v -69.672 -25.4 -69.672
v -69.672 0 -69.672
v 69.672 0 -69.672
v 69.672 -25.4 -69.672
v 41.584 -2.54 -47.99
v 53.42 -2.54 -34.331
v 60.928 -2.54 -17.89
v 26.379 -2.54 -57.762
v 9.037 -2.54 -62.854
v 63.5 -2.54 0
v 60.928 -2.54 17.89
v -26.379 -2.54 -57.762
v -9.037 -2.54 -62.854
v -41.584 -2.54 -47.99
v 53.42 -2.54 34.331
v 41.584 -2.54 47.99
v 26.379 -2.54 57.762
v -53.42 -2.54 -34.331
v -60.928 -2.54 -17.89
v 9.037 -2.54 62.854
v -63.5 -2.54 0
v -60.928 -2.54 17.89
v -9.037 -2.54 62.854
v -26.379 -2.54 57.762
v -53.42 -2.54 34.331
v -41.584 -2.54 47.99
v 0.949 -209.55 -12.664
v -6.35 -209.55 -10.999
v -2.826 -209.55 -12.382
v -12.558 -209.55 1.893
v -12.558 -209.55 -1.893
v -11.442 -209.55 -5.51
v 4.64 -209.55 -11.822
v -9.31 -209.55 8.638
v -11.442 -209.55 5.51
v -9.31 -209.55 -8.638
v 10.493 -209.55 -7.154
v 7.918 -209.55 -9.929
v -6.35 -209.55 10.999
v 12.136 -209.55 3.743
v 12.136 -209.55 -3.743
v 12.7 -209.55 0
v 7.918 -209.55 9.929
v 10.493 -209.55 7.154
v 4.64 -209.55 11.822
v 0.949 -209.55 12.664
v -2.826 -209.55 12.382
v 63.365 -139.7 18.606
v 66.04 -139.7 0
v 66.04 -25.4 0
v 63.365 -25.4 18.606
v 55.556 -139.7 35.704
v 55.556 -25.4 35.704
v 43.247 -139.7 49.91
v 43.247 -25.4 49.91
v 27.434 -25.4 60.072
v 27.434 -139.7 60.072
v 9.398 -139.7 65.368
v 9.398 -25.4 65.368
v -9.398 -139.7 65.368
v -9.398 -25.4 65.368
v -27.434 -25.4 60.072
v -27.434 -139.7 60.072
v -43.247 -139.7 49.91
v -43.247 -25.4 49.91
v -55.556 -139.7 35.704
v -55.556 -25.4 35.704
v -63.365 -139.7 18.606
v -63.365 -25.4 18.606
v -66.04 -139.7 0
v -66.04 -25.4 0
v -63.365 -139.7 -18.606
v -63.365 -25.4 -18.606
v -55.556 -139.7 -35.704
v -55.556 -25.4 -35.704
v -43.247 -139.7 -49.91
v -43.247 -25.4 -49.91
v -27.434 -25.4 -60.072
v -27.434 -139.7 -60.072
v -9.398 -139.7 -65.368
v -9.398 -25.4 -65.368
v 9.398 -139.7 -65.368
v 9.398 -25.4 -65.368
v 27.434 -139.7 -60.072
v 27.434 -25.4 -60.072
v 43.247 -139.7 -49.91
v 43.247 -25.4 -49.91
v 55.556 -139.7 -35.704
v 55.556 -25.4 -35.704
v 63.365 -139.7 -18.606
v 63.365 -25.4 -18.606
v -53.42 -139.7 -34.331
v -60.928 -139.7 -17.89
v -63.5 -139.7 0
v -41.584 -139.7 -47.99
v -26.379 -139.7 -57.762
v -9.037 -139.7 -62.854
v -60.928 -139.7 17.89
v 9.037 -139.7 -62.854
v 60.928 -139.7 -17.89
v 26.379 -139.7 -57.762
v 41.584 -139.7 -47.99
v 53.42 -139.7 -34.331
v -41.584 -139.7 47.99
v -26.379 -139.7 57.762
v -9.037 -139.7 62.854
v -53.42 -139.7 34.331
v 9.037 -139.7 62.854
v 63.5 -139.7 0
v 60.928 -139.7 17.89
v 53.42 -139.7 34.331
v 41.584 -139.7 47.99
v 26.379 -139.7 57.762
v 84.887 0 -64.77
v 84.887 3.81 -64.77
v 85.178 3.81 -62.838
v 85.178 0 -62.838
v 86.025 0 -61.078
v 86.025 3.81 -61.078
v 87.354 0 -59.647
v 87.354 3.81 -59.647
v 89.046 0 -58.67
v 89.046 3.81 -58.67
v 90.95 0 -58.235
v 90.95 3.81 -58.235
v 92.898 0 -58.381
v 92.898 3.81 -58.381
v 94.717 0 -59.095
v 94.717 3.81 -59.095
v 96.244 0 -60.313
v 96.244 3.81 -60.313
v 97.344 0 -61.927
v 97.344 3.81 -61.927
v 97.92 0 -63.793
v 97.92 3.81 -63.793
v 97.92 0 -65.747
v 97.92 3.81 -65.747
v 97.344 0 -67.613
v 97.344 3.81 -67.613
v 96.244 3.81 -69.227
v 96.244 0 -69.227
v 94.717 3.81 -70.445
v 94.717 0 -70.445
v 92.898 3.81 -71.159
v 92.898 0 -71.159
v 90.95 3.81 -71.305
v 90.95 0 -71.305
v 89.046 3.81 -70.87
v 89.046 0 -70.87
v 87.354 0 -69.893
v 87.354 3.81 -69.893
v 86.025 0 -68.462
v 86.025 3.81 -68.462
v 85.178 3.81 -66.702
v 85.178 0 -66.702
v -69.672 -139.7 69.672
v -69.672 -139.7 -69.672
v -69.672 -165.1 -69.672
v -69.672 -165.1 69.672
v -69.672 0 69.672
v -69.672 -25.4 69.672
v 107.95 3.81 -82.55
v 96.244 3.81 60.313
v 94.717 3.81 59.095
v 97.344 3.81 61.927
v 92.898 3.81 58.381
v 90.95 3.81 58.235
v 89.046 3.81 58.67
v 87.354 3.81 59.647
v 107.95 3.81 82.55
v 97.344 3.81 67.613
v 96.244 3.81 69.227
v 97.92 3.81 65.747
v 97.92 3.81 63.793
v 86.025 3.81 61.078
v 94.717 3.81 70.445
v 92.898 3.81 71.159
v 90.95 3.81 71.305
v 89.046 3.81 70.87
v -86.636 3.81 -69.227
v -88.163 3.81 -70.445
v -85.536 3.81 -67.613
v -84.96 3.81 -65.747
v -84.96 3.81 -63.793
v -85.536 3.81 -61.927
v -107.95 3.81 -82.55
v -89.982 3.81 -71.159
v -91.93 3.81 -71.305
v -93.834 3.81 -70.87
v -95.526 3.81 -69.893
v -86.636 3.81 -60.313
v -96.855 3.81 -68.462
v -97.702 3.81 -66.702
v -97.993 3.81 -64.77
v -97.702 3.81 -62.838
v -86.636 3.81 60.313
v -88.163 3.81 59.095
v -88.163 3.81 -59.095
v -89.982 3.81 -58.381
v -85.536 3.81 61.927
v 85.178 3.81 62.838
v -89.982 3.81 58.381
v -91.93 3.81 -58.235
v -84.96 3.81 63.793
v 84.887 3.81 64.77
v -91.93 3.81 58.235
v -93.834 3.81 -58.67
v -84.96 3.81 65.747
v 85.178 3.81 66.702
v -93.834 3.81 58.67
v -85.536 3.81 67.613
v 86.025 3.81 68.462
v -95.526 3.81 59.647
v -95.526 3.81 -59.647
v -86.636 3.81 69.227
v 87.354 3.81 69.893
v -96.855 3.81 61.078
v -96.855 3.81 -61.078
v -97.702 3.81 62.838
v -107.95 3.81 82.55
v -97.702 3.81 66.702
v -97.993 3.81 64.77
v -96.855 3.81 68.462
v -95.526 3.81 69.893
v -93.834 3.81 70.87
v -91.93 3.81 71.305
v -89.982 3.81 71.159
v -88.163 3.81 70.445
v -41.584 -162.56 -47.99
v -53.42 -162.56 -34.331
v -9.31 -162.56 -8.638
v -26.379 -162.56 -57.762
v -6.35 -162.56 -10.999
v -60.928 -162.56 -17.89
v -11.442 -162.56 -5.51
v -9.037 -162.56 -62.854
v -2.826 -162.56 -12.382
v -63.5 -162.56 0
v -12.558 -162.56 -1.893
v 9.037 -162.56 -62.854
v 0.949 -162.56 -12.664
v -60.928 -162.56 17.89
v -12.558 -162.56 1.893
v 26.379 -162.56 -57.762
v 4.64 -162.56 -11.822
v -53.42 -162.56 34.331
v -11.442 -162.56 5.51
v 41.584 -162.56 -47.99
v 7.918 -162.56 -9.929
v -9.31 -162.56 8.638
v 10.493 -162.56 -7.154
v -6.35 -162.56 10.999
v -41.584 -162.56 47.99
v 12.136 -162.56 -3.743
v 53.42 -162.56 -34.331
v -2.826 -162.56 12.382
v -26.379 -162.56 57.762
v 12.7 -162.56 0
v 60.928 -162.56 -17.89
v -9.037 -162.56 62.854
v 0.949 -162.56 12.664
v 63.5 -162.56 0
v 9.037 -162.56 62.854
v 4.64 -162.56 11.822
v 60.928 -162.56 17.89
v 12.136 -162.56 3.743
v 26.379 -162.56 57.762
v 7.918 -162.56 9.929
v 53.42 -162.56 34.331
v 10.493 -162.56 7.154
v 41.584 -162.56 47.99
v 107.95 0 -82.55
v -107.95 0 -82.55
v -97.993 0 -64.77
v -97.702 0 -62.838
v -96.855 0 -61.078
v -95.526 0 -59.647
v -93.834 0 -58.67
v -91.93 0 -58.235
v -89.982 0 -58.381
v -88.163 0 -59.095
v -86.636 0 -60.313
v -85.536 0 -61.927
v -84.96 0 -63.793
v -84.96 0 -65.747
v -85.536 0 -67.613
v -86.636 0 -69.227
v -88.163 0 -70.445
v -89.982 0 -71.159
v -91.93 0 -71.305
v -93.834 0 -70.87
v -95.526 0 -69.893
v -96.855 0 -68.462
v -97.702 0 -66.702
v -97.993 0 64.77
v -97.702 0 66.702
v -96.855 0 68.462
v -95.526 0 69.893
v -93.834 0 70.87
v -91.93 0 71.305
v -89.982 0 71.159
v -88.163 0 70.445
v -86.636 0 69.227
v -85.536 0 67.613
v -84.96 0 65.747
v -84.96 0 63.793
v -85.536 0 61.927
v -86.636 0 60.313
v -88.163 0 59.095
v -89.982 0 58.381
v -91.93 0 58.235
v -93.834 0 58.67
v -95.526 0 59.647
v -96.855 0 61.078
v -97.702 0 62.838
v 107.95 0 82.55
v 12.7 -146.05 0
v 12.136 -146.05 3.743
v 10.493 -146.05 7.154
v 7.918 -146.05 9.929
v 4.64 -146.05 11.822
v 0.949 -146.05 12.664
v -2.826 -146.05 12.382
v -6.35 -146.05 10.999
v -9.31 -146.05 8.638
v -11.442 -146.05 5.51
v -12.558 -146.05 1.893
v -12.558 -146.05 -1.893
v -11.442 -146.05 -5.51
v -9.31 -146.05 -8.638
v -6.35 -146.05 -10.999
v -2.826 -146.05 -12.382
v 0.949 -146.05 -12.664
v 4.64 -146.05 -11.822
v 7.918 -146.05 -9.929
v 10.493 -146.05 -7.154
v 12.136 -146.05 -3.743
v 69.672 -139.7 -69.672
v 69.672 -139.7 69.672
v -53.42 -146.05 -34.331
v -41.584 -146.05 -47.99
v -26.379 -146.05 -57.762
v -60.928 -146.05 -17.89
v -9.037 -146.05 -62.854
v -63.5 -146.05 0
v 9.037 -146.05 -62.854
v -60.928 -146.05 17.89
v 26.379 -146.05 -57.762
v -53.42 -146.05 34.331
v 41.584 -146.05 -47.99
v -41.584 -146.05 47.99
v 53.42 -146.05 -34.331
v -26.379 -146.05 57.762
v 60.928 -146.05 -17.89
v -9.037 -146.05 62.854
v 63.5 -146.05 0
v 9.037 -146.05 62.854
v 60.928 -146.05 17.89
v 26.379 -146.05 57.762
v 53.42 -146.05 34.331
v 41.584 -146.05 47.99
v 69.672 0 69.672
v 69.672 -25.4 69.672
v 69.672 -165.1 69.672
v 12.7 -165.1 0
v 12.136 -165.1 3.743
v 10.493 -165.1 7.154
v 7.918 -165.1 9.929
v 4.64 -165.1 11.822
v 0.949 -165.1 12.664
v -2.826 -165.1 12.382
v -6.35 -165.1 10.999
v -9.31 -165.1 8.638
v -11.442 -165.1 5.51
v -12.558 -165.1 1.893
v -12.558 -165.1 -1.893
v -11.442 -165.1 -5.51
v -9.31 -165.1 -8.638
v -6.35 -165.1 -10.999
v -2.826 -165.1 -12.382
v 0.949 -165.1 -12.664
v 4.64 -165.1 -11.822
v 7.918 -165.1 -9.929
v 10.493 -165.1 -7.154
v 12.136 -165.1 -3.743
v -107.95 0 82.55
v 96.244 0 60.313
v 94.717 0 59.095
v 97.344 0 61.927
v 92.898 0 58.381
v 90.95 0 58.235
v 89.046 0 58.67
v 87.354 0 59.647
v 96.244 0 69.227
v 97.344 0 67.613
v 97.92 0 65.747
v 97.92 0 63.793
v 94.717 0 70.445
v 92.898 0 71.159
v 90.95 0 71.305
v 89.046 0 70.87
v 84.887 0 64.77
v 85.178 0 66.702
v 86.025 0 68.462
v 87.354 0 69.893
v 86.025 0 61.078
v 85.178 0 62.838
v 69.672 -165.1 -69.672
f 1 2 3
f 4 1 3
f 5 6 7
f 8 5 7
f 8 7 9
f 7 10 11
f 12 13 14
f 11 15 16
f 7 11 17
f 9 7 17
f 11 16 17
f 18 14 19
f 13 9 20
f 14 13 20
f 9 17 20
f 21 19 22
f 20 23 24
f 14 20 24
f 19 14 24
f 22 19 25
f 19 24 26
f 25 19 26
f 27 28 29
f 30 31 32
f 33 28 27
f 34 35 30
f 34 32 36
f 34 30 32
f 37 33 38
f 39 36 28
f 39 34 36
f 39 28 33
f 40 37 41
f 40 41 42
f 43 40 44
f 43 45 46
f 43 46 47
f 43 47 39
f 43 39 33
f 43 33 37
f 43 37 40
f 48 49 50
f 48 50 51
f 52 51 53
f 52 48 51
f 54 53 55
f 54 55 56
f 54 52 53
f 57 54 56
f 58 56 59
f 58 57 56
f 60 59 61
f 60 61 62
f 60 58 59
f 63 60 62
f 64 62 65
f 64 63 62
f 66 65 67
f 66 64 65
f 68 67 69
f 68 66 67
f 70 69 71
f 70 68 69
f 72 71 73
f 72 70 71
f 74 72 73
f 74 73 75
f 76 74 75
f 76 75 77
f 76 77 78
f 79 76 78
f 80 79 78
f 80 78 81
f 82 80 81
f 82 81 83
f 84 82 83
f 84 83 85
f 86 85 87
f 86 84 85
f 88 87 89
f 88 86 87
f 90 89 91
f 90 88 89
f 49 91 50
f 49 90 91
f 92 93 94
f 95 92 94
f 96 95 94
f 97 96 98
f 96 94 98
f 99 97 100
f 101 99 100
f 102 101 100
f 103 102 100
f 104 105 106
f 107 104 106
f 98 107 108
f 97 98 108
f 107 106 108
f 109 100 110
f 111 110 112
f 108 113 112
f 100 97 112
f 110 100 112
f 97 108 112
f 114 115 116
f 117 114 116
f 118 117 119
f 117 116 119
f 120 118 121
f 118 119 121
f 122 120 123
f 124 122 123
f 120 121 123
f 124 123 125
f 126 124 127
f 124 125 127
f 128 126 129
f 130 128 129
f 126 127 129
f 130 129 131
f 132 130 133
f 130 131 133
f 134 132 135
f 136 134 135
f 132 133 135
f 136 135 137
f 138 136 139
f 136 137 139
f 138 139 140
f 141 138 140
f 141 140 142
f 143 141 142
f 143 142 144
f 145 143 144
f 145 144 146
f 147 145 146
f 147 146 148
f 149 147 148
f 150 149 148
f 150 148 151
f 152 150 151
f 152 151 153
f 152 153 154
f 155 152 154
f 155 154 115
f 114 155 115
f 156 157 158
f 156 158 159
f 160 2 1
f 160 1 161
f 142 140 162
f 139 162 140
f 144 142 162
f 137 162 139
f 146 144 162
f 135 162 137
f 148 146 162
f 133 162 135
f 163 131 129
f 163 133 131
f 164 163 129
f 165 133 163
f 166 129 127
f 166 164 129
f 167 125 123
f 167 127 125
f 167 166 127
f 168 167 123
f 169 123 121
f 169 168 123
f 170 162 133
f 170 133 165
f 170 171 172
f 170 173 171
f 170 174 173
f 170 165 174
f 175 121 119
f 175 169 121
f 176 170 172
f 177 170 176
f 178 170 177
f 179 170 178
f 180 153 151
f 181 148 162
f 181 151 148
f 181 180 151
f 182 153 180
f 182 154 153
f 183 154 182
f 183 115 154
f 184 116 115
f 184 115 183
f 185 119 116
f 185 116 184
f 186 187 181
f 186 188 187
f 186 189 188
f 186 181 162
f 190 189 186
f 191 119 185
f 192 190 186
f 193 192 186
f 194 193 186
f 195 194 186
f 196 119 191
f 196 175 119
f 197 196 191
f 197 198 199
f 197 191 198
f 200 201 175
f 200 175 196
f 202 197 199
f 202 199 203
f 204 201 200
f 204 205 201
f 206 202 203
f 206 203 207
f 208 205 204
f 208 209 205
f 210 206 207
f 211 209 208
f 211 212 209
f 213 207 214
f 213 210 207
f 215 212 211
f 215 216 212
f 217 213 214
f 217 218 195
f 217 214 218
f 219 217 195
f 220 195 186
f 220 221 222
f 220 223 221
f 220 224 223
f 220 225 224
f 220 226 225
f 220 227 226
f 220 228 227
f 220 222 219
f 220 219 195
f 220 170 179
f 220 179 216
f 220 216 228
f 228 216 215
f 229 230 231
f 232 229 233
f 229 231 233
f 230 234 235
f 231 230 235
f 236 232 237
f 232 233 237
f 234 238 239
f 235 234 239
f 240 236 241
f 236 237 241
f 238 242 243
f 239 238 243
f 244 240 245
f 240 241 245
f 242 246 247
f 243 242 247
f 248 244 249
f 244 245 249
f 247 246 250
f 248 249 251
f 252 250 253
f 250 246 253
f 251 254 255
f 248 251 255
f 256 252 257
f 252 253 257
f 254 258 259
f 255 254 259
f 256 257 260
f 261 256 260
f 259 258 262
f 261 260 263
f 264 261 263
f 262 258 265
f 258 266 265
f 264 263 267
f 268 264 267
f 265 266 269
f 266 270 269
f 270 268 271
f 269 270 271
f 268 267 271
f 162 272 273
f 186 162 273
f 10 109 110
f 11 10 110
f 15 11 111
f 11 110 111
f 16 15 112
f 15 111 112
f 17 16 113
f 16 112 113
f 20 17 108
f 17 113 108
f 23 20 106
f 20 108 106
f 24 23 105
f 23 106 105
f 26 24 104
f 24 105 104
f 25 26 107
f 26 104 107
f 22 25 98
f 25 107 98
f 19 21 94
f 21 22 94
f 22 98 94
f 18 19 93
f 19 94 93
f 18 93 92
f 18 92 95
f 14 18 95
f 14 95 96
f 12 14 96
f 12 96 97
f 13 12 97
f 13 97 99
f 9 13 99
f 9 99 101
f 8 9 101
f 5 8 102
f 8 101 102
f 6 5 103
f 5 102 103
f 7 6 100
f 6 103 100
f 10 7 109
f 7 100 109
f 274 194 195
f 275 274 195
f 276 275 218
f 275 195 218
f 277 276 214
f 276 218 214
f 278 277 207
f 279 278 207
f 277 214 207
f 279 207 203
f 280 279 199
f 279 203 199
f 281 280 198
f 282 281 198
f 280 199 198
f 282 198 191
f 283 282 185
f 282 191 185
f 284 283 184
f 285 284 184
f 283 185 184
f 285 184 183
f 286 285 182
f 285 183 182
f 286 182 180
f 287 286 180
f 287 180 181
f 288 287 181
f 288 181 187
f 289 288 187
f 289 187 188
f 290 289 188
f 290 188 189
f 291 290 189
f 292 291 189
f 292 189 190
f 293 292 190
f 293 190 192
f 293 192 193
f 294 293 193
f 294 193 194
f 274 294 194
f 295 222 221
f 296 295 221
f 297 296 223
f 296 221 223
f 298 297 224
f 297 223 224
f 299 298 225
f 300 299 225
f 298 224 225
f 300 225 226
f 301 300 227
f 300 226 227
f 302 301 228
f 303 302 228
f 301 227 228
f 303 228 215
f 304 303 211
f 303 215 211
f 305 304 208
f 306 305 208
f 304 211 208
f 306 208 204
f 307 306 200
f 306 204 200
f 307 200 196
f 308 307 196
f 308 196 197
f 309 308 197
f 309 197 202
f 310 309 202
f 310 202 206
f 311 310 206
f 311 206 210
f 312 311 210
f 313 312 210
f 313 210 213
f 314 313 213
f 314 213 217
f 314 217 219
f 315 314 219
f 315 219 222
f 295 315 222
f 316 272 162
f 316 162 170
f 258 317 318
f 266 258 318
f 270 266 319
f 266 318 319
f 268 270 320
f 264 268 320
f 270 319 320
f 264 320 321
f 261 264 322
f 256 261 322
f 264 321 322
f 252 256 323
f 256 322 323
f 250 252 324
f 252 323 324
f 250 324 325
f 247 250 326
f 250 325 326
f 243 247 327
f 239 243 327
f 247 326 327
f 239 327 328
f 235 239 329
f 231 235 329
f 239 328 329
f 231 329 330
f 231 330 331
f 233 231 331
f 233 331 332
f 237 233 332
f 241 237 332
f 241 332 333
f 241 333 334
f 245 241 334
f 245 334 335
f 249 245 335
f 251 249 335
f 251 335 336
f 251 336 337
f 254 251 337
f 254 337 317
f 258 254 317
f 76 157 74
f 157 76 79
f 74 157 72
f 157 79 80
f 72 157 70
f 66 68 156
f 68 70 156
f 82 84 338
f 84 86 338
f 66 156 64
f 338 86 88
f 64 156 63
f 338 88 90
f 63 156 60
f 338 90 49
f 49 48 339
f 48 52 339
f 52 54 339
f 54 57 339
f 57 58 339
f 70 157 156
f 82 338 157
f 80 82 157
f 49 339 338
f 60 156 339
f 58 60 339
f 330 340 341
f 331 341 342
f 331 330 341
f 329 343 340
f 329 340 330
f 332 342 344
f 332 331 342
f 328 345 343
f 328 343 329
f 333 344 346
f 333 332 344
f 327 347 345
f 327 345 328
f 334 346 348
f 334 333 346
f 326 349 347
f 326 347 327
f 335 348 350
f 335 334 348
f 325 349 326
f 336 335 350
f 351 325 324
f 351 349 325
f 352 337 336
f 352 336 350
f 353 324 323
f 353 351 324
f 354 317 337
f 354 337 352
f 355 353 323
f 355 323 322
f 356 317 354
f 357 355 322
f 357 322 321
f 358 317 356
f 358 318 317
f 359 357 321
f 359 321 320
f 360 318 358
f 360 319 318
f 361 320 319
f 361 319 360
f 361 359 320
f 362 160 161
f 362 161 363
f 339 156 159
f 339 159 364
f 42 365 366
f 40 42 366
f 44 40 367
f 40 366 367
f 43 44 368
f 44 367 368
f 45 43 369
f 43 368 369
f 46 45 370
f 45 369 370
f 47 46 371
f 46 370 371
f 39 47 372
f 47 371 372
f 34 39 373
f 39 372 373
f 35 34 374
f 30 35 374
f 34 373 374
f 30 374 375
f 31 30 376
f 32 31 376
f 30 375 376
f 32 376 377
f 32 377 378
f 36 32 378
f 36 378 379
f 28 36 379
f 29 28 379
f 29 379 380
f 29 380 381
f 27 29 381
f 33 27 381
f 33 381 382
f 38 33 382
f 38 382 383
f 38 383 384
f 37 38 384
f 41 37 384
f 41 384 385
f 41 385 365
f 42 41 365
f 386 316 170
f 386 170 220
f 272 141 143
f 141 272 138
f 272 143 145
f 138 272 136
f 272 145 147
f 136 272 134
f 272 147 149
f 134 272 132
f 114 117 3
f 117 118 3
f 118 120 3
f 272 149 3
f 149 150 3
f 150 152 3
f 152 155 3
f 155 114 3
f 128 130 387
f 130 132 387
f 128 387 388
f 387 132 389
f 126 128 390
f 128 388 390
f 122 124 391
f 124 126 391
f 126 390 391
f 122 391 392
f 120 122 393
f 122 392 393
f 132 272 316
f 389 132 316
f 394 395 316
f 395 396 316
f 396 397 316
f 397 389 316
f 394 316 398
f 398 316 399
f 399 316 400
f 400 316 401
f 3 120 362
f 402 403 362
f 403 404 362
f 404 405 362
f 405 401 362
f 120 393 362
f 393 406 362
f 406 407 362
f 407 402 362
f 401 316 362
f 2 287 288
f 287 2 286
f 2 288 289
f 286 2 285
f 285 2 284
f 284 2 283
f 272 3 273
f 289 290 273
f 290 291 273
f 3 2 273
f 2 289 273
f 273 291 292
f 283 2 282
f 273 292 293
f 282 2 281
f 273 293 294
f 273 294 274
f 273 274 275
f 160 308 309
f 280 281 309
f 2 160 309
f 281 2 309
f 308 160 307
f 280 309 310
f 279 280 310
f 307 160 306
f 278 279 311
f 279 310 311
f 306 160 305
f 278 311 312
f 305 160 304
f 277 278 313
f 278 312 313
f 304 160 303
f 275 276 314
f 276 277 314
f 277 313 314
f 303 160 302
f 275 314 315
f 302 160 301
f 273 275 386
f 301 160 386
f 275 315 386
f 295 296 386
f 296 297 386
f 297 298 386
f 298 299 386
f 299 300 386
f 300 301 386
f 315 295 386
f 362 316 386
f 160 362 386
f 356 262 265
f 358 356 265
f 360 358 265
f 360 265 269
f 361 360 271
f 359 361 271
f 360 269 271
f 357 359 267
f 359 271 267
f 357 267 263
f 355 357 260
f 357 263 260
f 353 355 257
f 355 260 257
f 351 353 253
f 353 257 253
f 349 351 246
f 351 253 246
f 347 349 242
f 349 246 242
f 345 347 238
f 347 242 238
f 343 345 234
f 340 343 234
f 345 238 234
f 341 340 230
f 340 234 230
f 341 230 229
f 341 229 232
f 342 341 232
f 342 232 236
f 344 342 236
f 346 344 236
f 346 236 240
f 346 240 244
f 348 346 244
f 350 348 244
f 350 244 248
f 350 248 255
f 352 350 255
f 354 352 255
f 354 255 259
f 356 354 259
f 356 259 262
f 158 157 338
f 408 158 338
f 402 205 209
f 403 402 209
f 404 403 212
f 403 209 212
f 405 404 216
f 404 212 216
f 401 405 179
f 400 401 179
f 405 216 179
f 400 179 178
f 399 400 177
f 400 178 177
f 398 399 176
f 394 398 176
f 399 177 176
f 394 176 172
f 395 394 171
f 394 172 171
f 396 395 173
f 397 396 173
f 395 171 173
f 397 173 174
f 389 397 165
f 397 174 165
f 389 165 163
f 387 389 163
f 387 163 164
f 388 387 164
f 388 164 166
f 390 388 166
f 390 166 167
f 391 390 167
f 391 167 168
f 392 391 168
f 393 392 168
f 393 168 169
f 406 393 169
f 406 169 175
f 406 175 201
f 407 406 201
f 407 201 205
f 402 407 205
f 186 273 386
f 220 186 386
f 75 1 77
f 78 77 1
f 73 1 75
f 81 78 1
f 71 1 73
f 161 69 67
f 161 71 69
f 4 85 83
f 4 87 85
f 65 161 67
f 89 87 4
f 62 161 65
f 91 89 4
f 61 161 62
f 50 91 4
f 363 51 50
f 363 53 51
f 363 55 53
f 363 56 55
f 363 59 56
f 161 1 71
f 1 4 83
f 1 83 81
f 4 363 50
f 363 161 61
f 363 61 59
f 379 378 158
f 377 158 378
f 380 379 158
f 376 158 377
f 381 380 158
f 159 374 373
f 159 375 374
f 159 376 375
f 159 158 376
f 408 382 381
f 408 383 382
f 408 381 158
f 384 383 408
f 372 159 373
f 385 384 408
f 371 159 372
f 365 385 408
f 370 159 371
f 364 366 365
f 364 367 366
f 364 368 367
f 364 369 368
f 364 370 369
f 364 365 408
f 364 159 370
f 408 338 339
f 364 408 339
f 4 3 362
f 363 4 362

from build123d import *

# Parameters (mm, degrees)
F0_W      = 139.3444
F0_H      = 139.3444
F1_DEPTH  = 165.1
F3_W      = 139.3444
F3_H      = 139.3444
F3_R      = 66.04
F4_DEPTH  = 114.3
F5_R      = 63.5
F6_DEPTH  = 165.101
F7_R      = 63.5
F8_DEPTH  = 2.54
F9_R      = 63.5
F10_DEPTH = 6.35
F11_R     = 12.7
F12_DEPTH = 63.5
F13_W     = 215.9
F13_H     = 165.1
F14_DEPTH = 3.81
F16_D     = 13.1064
F17_R     = 63.5
F17_R_2   = 12.7
F18_DEPTH = 2.54


with BuildPart() as f1:
    # F0 (on Front) → F1 (new body)
    with BuildSketch(Plane.XZ):
        Rectangle(F0_W, F0_H)
    extrude(amount=F1_DEPTH)

    # F3 (on offset) → F4 (cut)
    with BuildSketch(Plane.XZ.offset(139.7)):
        Rectangle(F3_W, F3_H)
        Circle(F3_R, mode=Mode.SUBTRACT)
    extrude(amount=-F4_DEPTH, mode=Mode.SUBTRACT)

    # F5 (on face) → F6 (cut, through all)
    with BuildSketch(Plane.XZ.offset(165.1)):
        Circle(F5_R)
    extrude(amount=-F6_DEPTH, mode=Mode.SUBTRACT)

    # F7 (on face) → F8 (join)
    with BuildSketch(Plane(origin=(0, 0, 0), x_dir=(-1, 0, 0), z_dir=(0, 1, 0))):
        Circle(F7_R)
    extrude(amount=-F8_DEPTH)

    # F9 (on offset) → F10 (join)
    with BuildSketch(Plane.XZ.offset(139.7)):
        Circle(F9_R)
    extrude(amount=F10_DEPTH)

    # F11 (on face) → F12 (join)
    with BuildSketch(Plane.XZ.offset(146.05)):
        Circle(F11_R)
    extrude(amount=F12_DEPTH)

    # F13 (on face) → F14 (join)
    with BuildSketch(Plane(origin=(0, 0, 0), x_dir=(-1, 0, 0), z_dir=(0, 1, 0))):
        Rectangle(F13_W, F13_H)
    extrude(amount=F14_DEPTH)

    # F16 (through all)
    with Locations(Plane.XZ):
        with Locations((91.44, 64.77), (91.44, -64.77), (-91.44, 64.77), (-91.44, -64.77)):
            Hole(F16_D / 2)

    # F17 (on face) → F18 (join)
    with BuildSketch(Plane.XZ.offset(165.1)):
        Circle(F17_R)
        Circle(F17_R_2, mode=Mode.SUBTRACT)
    extrude(amount=-F18_DEPTH)


solid = f1.part
